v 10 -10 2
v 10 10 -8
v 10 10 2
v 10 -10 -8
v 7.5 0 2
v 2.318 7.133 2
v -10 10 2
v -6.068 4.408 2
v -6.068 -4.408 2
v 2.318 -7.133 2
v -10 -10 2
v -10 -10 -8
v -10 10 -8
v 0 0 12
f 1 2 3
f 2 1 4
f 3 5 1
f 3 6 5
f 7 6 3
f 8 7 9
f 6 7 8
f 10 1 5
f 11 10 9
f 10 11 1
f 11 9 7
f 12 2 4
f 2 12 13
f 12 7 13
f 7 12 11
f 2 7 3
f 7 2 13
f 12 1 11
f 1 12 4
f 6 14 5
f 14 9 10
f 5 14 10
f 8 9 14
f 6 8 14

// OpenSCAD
/* coincident tests */
translate([0,0,2]) {
    // polygon(points=[[1,2],[3,4],[5,6]]);
    translate([0,0,-5]) {
        cube([20,20,10], center=true);
    }
    translate([0,0,+5]) {
        cylinder(h = 10, d1 = 15, d2=0, $fn = 5, center=true);
    }
}
